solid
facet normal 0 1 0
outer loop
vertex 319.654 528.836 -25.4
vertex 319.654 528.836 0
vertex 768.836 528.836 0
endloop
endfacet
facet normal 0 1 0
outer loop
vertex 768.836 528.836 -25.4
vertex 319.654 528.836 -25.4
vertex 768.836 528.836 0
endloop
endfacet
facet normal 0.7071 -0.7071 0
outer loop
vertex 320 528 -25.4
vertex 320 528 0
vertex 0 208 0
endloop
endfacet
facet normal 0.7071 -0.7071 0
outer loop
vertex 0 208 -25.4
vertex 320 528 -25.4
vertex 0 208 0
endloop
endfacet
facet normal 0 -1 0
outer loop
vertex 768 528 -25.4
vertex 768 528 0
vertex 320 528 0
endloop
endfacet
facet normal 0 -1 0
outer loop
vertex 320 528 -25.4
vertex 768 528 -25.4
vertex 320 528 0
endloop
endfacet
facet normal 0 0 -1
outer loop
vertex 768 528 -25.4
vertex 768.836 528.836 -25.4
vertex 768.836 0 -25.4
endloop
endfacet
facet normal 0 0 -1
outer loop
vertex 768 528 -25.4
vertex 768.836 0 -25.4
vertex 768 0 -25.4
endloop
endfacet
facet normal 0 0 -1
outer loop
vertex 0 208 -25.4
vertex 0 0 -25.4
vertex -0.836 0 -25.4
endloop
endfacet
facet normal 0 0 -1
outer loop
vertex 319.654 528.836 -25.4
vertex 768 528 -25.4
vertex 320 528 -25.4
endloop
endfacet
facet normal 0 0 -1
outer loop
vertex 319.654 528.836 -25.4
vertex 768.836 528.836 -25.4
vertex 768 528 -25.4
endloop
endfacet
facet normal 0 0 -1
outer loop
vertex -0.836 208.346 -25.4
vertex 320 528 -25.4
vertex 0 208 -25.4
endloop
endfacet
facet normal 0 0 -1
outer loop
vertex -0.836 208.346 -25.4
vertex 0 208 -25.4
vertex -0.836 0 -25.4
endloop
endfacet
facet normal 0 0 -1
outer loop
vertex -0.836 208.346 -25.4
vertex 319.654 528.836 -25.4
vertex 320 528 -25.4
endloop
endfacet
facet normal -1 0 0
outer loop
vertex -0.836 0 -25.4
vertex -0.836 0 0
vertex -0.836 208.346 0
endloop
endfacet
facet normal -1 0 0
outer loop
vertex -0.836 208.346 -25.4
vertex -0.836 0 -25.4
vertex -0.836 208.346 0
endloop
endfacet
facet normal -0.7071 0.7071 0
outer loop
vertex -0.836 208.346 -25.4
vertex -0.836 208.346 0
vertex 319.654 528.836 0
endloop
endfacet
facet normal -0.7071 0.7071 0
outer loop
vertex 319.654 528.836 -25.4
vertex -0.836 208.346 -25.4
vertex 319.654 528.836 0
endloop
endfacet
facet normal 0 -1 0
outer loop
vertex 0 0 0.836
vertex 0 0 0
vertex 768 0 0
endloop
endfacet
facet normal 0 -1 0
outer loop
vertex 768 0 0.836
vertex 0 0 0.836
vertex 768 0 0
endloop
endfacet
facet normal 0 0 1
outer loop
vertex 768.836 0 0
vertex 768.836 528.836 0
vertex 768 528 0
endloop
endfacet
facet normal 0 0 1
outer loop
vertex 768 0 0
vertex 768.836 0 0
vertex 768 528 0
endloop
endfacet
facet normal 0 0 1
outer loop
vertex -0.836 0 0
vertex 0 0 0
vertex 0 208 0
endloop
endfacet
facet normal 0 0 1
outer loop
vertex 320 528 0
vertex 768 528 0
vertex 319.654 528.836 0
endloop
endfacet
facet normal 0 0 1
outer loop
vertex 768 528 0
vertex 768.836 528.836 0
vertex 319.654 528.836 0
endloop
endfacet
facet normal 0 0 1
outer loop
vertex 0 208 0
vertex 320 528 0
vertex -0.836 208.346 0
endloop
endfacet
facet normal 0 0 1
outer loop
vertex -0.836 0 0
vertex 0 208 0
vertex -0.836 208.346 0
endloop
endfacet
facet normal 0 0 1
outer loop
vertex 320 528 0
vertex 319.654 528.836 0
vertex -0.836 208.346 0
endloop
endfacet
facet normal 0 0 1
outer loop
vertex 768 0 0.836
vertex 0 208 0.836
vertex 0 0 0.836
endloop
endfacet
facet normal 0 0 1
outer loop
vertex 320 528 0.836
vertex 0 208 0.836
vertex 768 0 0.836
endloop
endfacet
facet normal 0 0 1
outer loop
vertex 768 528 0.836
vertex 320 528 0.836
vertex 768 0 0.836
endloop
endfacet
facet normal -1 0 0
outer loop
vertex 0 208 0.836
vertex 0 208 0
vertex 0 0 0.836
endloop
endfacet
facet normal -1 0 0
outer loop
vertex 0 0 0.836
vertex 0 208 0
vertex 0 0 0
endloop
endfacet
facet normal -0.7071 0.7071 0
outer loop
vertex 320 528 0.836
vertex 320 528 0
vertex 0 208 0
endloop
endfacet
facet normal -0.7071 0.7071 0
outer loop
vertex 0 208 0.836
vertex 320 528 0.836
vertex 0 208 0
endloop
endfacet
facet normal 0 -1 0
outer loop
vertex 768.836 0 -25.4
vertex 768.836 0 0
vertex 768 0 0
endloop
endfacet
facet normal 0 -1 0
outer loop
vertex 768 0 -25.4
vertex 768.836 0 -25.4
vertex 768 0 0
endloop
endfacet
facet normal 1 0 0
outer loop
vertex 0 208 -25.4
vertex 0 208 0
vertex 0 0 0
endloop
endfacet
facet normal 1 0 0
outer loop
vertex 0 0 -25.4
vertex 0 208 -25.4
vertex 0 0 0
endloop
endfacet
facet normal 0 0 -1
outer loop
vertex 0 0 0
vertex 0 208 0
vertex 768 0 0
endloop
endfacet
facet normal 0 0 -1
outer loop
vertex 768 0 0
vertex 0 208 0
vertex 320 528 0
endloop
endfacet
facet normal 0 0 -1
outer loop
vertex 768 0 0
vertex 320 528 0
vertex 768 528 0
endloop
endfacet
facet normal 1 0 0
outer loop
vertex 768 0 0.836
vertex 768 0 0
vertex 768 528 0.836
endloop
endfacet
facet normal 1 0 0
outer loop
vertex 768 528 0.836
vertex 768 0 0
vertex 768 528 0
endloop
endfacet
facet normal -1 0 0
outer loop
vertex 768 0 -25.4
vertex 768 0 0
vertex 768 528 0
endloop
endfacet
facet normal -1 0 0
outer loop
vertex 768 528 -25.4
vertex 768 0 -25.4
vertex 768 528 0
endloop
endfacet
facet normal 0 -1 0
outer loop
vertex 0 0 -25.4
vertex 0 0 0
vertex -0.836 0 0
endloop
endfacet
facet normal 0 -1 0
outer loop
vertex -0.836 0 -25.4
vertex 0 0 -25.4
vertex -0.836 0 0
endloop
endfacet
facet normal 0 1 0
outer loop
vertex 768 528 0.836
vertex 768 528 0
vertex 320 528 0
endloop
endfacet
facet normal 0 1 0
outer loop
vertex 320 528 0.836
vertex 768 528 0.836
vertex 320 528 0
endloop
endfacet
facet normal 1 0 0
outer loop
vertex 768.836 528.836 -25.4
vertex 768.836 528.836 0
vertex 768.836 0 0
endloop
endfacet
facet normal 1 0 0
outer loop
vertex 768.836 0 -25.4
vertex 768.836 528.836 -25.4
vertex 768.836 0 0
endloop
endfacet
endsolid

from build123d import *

# Parameters (mm, degrees)
SALIENTE_EXTRUIR1_DEPTH = 0.83566
SALIENTE_EXTRUIR2_DEPTH = 25.4


with BuildPart() as part:
    # Croquis1 → Saliente-Extruir1 (new body)
    with BuildSketch(Plane.XY):
        Polygon((0, 0), (768, 0), (768, 528), (320, 528), (0, 208), align=None)
    extrude(amount=SALIENTE_EXTRUIR1_DEPTH)


with BuildPart() as body_2:
    # Croquis3 → Saliente-Extruir2 (new body)
    with BuildSketch(Plane(origin=(0, 0, 0), x_dir=(-1, 0, 0), z_dir=(0, 0, -1))):
        Polygon((0.83566, 0), (0.83566, 208.346141706), (-319.653858294, 528.83566), (-768.83566, 528.83566), (-768.83566, 0), (-768, 0), (-768, 528), (-320, 528), (0, 208), (0, 0), align=None)
    extrude(amount=SALIENTE_EXTRUIR2_DEPTH)


solid = Compound([part.part, body_2.part])
